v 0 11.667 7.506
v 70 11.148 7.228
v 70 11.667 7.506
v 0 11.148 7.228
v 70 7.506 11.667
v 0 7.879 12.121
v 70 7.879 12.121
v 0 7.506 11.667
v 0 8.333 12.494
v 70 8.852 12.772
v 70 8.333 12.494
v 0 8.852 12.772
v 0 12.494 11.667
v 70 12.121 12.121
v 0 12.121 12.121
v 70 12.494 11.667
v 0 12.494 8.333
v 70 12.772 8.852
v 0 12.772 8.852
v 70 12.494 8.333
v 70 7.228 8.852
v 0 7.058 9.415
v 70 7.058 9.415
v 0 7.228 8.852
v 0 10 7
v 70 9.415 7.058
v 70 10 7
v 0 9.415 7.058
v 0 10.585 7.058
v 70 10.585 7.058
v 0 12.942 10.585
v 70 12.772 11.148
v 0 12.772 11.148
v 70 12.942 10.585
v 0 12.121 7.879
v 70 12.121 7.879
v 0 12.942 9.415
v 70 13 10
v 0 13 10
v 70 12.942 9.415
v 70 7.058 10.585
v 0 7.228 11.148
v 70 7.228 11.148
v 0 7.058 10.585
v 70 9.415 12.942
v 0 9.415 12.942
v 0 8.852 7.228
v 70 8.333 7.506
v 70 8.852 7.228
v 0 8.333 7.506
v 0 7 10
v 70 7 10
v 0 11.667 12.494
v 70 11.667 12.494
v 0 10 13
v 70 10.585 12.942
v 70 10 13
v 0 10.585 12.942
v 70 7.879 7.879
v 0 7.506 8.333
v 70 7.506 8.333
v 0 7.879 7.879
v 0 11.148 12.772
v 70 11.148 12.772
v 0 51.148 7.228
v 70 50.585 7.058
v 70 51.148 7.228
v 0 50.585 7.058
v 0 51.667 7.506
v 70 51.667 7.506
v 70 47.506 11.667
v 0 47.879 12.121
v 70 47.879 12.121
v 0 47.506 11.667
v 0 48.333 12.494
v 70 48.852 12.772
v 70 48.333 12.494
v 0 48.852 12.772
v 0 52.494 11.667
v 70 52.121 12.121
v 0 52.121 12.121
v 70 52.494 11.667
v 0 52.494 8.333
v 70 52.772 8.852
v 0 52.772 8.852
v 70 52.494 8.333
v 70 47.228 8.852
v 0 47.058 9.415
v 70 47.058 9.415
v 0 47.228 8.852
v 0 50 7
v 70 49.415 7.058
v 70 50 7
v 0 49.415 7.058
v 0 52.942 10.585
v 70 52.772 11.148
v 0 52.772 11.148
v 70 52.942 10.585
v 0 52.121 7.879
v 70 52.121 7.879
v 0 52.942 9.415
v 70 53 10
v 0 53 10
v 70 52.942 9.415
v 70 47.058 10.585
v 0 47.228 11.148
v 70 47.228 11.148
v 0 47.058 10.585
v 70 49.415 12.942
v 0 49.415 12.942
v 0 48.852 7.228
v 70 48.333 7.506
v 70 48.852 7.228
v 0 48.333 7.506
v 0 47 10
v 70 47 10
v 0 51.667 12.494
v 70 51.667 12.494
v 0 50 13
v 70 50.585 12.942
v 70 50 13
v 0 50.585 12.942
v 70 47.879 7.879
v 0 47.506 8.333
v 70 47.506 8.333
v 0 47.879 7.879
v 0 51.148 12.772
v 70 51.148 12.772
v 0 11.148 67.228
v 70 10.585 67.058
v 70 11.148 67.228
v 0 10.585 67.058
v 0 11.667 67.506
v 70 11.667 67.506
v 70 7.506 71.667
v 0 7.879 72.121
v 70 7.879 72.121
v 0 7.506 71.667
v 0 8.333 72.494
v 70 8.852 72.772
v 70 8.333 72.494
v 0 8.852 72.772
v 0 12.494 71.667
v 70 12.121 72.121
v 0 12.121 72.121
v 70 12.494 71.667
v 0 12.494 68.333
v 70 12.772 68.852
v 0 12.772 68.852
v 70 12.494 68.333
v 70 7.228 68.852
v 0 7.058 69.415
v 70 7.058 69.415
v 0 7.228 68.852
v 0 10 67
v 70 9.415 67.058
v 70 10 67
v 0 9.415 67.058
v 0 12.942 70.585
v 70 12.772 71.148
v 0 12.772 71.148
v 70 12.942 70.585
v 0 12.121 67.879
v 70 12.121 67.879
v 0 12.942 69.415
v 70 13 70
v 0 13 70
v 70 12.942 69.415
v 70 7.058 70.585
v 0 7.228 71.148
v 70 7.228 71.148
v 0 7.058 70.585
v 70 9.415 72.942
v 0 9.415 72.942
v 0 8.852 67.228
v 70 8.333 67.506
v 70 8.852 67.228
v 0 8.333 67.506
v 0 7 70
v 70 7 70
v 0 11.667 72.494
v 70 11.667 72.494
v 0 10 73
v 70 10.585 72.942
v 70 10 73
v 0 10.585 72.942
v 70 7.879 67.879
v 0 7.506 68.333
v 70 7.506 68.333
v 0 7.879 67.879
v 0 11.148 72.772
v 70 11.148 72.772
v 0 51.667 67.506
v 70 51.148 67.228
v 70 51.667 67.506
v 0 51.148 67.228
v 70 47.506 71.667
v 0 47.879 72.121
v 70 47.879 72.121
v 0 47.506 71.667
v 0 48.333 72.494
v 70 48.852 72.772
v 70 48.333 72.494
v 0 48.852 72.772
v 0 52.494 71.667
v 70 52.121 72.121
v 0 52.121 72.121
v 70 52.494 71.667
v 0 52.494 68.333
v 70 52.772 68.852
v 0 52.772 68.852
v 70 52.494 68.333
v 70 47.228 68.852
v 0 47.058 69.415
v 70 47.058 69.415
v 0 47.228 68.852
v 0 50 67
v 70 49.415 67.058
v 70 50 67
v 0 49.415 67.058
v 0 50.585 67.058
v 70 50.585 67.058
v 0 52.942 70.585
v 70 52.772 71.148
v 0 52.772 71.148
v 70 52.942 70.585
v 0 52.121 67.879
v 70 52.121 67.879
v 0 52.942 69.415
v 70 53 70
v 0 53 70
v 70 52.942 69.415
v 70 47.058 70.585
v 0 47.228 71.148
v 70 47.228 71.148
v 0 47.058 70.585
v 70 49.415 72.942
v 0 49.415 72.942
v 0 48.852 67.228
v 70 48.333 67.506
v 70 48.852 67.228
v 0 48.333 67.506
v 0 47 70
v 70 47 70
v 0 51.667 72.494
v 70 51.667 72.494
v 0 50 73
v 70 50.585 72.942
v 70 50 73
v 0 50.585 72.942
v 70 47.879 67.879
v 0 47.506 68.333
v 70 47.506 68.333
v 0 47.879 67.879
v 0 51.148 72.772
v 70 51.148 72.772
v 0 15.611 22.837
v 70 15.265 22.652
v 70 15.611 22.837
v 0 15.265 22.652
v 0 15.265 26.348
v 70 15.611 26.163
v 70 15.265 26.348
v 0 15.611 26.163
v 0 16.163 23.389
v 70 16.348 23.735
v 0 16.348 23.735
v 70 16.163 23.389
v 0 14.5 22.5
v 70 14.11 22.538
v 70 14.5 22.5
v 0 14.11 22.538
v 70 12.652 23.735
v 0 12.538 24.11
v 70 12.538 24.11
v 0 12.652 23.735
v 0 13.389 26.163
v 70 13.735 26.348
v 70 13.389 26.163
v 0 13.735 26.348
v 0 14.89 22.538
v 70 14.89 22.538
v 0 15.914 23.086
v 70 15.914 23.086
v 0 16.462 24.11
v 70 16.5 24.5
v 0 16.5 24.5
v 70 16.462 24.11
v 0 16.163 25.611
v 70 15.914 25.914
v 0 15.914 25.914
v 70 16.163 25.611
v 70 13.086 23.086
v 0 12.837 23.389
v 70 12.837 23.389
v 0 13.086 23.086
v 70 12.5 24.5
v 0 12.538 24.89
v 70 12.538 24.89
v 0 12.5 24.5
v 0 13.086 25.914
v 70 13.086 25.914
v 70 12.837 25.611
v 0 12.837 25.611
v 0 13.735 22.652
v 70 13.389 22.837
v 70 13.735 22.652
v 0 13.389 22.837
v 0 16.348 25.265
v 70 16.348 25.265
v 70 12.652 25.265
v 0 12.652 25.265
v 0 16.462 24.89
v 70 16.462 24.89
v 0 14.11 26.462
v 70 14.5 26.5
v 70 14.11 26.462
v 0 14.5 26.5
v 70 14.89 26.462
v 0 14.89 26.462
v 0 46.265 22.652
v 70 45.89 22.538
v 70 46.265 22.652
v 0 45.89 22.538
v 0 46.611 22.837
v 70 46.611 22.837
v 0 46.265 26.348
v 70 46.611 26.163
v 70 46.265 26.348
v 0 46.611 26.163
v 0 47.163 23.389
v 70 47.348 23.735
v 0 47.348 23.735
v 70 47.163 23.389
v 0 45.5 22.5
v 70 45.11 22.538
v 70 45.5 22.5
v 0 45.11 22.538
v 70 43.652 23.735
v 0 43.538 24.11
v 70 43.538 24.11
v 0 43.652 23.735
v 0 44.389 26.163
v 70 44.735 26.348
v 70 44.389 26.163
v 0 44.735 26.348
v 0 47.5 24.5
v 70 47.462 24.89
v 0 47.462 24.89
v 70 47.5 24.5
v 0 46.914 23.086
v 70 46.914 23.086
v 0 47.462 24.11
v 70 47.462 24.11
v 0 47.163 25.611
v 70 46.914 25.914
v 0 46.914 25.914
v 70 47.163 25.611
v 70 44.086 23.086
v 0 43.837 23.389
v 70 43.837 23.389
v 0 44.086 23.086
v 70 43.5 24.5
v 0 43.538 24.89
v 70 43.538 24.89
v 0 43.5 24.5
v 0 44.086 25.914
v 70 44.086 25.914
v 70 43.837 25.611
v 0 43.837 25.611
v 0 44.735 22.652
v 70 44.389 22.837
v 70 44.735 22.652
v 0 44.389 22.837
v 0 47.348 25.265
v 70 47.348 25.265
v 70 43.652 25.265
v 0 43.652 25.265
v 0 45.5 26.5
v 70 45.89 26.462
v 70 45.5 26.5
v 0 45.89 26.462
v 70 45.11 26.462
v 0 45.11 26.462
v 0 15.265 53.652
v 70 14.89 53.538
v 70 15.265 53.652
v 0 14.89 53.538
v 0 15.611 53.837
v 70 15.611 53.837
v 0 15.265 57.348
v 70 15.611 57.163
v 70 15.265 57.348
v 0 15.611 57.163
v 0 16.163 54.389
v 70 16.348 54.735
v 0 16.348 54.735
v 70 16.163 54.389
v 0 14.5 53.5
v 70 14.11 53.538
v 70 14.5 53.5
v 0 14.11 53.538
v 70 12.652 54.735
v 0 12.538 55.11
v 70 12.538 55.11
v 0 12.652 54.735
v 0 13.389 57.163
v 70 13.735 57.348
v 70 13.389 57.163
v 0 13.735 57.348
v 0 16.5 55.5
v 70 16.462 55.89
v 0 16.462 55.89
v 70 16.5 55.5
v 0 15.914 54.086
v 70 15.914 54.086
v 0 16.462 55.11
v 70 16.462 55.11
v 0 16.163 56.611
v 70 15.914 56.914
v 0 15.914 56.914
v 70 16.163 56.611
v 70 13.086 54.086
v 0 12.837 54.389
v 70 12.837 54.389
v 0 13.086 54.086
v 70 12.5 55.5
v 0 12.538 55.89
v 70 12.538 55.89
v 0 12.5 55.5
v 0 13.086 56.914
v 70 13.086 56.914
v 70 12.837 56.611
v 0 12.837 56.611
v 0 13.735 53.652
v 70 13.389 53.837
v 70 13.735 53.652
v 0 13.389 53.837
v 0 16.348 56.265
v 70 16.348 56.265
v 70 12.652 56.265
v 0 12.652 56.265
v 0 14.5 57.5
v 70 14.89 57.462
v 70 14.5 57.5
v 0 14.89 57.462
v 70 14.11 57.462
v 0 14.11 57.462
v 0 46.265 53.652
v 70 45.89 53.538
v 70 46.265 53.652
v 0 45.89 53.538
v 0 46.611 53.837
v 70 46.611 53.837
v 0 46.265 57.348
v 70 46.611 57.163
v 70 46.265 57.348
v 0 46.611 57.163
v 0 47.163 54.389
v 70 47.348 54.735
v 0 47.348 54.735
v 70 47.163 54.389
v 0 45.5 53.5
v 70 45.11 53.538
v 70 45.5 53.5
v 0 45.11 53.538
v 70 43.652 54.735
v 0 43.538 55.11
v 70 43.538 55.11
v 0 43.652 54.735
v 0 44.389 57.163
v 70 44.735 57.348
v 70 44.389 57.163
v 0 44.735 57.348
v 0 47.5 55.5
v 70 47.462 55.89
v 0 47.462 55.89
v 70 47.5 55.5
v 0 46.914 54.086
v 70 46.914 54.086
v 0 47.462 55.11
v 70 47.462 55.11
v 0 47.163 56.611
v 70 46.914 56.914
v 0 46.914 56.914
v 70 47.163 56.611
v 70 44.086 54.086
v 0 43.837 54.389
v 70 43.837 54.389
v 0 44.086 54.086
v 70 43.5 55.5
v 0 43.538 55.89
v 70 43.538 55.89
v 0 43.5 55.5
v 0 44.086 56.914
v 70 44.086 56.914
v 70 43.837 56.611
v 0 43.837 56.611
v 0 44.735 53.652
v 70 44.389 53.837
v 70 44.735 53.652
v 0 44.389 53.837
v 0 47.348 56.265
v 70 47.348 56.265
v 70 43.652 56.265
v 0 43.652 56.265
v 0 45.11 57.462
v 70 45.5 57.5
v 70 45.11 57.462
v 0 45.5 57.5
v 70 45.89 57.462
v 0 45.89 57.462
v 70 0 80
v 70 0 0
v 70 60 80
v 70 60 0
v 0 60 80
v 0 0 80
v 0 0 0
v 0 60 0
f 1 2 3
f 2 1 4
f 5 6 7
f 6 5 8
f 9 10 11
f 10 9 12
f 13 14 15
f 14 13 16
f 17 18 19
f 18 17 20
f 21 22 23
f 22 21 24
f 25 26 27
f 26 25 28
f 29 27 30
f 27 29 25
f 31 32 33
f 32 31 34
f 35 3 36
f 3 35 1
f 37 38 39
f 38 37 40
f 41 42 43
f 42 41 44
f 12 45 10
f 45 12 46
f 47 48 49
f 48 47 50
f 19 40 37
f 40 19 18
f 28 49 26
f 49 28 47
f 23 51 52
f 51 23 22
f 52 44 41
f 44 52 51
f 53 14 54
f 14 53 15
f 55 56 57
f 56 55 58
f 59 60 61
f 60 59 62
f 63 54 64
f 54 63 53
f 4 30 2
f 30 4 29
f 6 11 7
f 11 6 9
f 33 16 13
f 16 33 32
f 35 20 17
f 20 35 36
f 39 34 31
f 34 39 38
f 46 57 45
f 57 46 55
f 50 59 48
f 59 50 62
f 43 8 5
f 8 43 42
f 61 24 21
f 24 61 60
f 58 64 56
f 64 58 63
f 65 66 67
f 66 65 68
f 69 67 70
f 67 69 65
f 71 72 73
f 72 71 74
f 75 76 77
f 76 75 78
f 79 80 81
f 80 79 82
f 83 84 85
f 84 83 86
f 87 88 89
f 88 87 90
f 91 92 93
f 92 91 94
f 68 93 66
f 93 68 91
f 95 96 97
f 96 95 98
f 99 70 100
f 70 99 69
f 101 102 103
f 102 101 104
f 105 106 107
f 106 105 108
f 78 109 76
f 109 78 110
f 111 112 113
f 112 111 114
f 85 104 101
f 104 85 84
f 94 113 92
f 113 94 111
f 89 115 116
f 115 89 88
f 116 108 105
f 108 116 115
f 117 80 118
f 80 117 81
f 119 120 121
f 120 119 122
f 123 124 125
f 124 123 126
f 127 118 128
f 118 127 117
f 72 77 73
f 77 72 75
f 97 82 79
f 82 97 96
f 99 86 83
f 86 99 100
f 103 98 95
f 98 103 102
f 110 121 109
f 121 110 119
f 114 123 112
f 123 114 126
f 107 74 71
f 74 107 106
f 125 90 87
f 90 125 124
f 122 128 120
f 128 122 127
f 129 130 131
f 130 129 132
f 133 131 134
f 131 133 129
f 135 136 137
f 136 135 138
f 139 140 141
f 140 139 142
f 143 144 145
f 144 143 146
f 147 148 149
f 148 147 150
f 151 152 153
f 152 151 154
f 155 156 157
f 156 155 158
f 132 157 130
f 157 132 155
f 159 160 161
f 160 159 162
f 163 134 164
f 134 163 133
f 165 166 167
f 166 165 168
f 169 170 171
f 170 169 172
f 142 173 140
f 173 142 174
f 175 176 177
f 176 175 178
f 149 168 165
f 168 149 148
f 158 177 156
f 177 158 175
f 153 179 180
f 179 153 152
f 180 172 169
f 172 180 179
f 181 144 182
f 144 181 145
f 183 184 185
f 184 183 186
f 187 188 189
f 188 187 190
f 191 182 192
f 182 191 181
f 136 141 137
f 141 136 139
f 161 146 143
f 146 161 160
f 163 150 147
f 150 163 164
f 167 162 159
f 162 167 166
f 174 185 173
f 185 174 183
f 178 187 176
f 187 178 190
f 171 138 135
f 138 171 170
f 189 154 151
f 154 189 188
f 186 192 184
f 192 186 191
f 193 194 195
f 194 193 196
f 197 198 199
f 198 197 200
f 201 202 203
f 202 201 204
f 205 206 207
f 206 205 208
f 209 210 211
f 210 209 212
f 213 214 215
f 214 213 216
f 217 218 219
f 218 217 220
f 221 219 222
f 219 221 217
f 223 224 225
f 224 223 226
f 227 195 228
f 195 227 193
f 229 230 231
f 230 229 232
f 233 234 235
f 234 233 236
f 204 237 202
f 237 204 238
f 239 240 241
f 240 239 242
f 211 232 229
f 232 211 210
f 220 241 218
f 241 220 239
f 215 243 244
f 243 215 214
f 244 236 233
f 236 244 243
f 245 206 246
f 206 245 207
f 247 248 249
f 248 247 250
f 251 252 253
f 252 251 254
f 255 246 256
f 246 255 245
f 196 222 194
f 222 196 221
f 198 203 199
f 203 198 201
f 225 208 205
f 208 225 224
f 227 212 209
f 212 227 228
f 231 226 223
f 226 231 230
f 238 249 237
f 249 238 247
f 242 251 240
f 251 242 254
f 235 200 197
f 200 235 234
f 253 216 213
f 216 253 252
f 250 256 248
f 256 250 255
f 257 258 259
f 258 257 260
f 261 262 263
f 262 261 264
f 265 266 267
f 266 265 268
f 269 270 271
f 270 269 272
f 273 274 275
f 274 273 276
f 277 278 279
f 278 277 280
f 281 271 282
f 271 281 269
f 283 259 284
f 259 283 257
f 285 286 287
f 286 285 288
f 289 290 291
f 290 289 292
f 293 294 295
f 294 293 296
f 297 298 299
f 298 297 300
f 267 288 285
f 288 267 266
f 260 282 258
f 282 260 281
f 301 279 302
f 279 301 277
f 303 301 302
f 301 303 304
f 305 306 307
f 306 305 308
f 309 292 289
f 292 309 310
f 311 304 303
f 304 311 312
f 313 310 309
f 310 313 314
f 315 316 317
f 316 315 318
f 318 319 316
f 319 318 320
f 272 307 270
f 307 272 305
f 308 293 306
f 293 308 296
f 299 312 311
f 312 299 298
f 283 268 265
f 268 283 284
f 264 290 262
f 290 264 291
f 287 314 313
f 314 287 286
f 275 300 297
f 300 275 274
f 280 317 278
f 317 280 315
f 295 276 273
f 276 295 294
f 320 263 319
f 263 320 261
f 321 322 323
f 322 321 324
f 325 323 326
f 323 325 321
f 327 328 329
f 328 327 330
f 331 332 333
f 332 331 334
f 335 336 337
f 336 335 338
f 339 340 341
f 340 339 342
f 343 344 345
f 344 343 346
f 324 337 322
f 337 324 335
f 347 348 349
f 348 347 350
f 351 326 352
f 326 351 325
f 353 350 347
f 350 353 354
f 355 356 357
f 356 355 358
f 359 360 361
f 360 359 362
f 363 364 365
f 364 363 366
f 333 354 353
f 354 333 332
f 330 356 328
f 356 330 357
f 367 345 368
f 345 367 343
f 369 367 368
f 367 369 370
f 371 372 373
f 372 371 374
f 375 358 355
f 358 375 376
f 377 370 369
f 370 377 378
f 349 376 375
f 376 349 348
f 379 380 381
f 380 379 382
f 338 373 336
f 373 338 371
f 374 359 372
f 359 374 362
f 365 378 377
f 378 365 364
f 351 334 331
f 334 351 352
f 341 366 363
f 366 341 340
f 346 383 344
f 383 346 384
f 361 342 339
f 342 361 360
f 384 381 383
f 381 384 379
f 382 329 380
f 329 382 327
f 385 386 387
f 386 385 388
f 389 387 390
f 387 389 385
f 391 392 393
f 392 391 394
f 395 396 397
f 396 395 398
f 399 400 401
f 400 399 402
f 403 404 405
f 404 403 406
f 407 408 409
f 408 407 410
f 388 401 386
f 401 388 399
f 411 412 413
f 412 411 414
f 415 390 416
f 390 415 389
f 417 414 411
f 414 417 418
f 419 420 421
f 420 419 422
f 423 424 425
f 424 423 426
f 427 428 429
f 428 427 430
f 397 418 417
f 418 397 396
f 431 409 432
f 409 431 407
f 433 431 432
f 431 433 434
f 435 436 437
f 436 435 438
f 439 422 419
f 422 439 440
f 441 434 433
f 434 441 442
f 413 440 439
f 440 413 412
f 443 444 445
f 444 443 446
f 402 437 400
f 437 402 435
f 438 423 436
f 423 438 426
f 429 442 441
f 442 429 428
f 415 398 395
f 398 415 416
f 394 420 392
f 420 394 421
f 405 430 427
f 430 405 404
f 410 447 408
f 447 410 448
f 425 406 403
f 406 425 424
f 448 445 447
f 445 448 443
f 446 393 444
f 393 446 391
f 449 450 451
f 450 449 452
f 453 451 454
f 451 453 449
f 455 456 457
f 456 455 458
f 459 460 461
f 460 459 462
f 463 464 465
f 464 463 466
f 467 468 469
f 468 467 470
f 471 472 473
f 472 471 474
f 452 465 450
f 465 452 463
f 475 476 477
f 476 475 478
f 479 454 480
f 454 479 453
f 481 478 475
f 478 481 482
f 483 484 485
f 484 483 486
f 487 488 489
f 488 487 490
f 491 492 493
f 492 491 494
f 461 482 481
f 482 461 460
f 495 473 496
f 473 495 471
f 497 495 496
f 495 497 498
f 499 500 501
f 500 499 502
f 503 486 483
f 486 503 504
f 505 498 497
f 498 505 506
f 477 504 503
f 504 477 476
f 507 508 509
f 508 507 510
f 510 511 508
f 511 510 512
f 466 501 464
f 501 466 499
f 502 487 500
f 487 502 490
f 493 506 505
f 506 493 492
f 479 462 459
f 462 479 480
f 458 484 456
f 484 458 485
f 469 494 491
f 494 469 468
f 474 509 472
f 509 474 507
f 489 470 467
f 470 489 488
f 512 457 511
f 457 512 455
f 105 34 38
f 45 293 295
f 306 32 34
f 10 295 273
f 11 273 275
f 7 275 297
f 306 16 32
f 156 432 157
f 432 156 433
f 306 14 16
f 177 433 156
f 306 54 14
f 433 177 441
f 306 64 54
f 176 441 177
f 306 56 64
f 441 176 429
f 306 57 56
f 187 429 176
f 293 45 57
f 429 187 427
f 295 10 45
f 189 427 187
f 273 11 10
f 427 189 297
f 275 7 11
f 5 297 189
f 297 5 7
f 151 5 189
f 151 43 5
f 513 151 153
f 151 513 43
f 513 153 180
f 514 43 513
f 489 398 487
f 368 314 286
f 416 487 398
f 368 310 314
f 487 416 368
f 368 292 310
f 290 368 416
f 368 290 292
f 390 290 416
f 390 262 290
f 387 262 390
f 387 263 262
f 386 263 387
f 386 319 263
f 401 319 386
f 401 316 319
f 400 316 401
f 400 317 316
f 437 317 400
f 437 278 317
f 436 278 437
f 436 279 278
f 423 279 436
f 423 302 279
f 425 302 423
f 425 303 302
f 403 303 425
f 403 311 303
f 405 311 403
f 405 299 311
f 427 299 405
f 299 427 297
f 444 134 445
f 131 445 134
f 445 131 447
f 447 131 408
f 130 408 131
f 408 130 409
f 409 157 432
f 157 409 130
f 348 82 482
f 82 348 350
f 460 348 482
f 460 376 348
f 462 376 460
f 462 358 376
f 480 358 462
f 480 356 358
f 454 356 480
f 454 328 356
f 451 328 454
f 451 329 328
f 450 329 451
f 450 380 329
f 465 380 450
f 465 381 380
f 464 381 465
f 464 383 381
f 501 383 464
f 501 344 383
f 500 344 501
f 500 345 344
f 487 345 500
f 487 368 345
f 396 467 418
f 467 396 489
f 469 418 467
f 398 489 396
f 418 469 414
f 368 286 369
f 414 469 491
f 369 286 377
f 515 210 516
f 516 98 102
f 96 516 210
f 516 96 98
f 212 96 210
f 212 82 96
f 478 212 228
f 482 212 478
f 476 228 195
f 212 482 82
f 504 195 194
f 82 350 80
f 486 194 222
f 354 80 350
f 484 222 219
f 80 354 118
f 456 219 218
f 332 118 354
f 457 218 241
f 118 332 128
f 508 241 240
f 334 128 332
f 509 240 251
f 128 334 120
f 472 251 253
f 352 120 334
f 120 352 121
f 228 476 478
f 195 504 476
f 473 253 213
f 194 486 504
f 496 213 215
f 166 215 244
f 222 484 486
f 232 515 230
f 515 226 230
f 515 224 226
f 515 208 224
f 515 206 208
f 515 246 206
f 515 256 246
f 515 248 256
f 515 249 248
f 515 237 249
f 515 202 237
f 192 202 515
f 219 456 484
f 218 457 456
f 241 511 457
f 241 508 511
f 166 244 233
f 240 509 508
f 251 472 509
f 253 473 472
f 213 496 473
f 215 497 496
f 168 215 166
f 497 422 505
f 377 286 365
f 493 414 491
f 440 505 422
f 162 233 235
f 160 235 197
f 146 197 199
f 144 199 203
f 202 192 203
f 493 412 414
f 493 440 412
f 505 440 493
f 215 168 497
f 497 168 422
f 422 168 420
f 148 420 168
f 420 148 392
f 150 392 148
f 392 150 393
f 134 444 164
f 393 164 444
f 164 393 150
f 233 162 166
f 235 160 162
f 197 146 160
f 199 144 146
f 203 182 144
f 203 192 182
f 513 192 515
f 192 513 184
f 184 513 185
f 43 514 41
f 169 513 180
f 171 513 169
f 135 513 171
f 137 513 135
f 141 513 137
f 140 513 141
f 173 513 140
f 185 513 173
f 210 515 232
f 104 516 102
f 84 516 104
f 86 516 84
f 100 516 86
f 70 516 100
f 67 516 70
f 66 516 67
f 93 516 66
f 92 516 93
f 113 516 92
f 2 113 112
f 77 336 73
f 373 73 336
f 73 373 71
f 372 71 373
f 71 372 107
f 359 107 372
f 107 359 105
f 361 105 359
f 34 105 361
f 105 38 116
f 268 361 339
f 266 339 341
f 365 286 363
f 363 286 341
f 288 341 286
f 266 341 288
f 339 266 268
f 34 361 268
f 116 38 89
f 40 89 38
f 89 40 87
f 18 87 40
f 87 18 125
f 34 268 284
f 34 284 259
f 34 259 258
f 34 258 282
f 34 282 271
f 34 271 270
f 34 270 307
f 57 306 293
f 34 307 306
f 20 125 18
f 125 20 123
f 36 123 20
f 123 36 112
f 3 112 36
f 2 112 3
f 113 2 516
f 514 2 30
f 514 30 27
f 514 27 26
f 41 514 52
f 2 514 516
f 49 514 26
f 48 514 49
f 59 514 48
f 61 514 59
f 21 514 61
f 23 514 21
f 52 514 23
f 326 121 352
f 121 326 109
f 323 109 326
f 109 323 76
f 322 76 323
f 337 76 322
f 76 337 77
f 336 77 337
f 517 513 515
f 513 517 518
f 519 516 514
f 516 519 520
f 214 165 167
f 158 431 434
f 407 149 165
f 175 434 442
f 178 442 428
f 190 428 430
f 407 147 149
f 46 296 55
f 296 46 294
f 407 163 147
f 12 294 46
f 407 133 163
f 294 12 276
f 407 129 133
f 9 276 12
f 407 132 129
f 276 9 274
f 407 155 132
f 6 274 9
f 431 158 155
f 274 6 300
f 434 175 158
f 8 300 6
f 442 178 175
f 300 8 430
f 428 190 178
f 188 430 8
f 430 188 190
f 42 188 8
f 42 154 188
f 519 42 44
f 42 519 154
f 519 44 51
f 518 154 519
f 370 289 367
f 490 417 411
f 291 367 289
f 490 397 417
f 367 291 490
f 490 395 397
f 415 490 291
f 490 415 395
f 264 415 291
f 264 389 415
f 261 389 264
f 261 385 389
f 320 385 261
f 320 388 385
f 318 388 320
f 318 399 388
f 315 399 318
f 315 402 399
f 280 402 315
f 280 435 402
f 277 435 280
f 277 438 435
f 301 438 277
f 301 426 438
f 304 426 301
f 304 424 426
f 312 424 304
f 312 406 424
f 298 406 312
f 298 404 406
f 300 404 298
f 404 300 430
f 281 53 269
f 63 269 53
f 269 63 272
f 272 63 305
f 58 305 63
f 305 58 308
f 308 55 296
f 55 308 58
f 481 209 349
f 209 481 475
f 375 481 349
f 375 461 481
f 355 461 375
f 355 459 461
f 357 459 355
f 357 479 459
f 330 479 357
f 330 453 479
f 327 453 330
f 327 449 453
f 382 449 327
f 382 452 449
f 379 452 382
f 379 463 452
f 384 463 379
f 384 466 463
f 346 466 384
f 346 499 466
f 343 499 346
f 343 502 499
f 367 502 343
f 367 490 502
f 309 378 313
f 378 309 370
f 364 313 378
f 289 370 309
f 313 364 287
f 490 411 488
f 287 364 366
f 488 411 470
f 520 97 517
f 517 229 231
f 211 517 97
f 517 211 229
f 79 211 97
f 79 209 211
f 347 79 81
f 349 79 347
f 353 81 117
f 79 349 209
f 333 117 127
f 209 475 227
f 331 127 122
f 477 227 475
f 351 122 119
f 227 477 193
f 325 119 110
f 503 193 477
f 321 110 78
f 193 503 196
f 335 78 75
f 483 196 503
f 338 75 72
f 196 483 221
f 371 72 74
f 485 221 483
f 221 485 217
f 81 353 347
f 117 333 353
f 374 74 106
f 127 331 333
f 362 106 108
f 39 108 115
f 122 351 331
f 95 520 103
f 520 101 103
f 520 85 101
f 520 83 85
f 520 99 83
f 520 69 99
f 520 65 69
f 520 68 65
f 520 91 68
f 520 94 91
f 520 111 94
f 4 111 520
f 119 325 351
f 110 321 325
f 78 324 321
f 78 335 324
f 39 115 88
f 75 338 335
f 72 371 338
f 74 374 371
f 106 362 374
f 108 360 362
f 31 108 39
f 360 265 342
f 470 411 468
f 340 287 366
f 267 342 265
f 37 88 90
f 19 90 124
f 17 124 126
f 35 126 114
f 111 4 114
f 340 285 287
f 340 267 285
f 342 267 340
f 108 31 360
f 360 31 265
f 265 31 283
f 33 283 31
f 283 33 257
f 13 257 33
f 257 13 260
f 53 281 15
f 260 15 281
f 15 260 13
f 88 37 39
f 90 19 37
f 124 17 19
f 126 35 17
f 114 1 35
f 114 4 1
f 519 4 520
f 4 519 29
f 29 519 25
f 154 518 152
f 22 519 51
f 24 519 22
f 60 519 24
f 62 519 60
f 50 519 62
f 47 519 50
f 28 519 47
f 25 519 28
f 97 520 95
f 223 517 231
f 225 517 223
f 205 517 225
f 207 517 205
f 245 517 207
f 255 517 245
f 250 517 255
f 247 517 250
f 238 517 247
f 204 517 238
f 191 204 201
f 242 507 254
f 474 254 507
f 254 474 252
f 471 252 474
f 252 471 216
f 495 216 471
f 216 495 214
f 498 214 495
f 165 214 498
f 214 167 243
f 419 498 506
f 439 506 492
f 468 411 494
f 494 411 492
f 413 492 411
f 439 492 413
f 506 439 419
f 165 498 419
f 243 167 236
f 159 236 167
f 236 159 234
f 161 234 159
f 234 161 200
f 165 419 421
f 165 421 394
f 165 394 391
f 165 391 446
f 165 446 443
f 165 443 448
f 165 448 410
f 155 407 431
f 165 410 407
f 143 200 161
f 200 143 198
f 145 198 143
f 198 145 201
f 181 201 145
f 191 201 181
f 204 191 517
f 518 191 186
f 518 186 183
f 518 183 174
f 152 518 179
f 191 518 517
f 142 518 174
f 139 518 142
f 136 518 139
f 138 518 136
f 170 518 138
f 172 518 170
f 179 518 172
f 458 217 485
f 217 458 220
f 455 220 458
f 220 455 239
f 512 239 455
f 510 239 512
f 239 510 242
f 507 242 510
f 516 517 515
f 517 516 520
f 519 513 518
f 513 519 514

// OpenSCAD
// scad/motor_mount.scad
// Parametric motor mount bracket.
// Wall-mounted plate (fixed at x_min), motor-mount plate on opposite face
// (loaded at x_max).  Both plates are part of a single solid block;
// topology optimization carves away non-load-bearing material between them.
//
// All caps variables are injected via -D flags from openscad_runner.py.
// Do not hardcode dimensions here — edit scad/motor_mount_params.json instead.

// ── Parameters ────────────────────────────────────────────────────────────
LENGTH                 = 70.0;   // X — wall → motor direction
WIDTH                  = 60.0;   // Y — bracket width
HEIGHT                 = 80.0;   // Z — bracket height

WALL_HOLE_DIAMETER     = 6.0;    // M5 clearance for wall bolts
WALL_HOLE_INSET        = 10.0;   // inset from Y/Z edges on wall face

MOTOR_HOLE_DIAMETER    = 4.0;    // M3 clearance for motor bolts
MOTOR_HOLE_PITCH       = 31.0;   // NEMA-17 bolt circle side length (mm)
MOTOR_CENTER_Y         = 30.0;   // Y centre of motor bolt pattern on x_max face
MOTOR_CENTER_Z         = 40.0;   // Z centre of motor bolt pattern on x_max face

// ── Derived ───────────────────────────────────────────────────────────────
wall_hole_r  = WALL_HOLE_DIAMETER  / 2;
motor_hole_r = MOTOR_HOLE_DIAMETER / 2;
fn_curve     = 32;
motor_half   = MOTOR_HOLE_PITCH    / 2;

// ── Solid block ───────────────────────────────────────────────────────────
module block() {
    cube([LENGTH, WIDTH, HEIGHT]);
}

// ── Wall-mount holes (4 corners of x_min face, drilled through X) ─────────
module wall_holes() {
    positions = [
        [WALL_HOLE_INSET,          WALL_HOLE_INSET          ],
        [WIDTH  - WALL_HOLE_INSET, WALL_HOLE_INSET          ],
        [WALL_HOLE_INSET,          HEIGHT - WALL_HOLE_INSET ],
        [WIDTH  - WALL_HOLE_INSET, HEIGHT - WALL_HOLE_INSET ],
    ];
    for (pos = positions) {
        translate([-1, pos[0], pos[1]])
            rotate([0, 90, 0])
                cylinder(r=wall_hole_r, h=LENGTH + 2, $fn=fn_curve);
    }
}

// ── Motor-mount holes (NEMA-17 square pattern on x_max face, drilled X) ───
module motor_holes() {
    positions = [
        [MOTOR_CENTER_Y - motor_half, MOTOR_CENTER_Z - motor_half],
        [MOTOR_CENTER_Y + motor_half, MOTOR_CENTER_Z - motor_half],
        [MOTOR_CENTER_Y - motor_half, MOTOR_CENTER_Z + motor_half],
        [MOTOR_CENTER_Y + motor_half, MOTOR_CENTER_Z + motor_half],
    ];
    for (pos = positions) {
        translate([-1, pos[0], pos[1]])
            rotate([0, 90, 0])
                cylinder(r=motor_hole_r, h=LENGTH + 2, $fn=fn_curve);
    }
}

// ── Assembly ──────────────────────────────────────────────────────────────
difference() {
    block();
    wall_holes();
    motor_holes();
}
